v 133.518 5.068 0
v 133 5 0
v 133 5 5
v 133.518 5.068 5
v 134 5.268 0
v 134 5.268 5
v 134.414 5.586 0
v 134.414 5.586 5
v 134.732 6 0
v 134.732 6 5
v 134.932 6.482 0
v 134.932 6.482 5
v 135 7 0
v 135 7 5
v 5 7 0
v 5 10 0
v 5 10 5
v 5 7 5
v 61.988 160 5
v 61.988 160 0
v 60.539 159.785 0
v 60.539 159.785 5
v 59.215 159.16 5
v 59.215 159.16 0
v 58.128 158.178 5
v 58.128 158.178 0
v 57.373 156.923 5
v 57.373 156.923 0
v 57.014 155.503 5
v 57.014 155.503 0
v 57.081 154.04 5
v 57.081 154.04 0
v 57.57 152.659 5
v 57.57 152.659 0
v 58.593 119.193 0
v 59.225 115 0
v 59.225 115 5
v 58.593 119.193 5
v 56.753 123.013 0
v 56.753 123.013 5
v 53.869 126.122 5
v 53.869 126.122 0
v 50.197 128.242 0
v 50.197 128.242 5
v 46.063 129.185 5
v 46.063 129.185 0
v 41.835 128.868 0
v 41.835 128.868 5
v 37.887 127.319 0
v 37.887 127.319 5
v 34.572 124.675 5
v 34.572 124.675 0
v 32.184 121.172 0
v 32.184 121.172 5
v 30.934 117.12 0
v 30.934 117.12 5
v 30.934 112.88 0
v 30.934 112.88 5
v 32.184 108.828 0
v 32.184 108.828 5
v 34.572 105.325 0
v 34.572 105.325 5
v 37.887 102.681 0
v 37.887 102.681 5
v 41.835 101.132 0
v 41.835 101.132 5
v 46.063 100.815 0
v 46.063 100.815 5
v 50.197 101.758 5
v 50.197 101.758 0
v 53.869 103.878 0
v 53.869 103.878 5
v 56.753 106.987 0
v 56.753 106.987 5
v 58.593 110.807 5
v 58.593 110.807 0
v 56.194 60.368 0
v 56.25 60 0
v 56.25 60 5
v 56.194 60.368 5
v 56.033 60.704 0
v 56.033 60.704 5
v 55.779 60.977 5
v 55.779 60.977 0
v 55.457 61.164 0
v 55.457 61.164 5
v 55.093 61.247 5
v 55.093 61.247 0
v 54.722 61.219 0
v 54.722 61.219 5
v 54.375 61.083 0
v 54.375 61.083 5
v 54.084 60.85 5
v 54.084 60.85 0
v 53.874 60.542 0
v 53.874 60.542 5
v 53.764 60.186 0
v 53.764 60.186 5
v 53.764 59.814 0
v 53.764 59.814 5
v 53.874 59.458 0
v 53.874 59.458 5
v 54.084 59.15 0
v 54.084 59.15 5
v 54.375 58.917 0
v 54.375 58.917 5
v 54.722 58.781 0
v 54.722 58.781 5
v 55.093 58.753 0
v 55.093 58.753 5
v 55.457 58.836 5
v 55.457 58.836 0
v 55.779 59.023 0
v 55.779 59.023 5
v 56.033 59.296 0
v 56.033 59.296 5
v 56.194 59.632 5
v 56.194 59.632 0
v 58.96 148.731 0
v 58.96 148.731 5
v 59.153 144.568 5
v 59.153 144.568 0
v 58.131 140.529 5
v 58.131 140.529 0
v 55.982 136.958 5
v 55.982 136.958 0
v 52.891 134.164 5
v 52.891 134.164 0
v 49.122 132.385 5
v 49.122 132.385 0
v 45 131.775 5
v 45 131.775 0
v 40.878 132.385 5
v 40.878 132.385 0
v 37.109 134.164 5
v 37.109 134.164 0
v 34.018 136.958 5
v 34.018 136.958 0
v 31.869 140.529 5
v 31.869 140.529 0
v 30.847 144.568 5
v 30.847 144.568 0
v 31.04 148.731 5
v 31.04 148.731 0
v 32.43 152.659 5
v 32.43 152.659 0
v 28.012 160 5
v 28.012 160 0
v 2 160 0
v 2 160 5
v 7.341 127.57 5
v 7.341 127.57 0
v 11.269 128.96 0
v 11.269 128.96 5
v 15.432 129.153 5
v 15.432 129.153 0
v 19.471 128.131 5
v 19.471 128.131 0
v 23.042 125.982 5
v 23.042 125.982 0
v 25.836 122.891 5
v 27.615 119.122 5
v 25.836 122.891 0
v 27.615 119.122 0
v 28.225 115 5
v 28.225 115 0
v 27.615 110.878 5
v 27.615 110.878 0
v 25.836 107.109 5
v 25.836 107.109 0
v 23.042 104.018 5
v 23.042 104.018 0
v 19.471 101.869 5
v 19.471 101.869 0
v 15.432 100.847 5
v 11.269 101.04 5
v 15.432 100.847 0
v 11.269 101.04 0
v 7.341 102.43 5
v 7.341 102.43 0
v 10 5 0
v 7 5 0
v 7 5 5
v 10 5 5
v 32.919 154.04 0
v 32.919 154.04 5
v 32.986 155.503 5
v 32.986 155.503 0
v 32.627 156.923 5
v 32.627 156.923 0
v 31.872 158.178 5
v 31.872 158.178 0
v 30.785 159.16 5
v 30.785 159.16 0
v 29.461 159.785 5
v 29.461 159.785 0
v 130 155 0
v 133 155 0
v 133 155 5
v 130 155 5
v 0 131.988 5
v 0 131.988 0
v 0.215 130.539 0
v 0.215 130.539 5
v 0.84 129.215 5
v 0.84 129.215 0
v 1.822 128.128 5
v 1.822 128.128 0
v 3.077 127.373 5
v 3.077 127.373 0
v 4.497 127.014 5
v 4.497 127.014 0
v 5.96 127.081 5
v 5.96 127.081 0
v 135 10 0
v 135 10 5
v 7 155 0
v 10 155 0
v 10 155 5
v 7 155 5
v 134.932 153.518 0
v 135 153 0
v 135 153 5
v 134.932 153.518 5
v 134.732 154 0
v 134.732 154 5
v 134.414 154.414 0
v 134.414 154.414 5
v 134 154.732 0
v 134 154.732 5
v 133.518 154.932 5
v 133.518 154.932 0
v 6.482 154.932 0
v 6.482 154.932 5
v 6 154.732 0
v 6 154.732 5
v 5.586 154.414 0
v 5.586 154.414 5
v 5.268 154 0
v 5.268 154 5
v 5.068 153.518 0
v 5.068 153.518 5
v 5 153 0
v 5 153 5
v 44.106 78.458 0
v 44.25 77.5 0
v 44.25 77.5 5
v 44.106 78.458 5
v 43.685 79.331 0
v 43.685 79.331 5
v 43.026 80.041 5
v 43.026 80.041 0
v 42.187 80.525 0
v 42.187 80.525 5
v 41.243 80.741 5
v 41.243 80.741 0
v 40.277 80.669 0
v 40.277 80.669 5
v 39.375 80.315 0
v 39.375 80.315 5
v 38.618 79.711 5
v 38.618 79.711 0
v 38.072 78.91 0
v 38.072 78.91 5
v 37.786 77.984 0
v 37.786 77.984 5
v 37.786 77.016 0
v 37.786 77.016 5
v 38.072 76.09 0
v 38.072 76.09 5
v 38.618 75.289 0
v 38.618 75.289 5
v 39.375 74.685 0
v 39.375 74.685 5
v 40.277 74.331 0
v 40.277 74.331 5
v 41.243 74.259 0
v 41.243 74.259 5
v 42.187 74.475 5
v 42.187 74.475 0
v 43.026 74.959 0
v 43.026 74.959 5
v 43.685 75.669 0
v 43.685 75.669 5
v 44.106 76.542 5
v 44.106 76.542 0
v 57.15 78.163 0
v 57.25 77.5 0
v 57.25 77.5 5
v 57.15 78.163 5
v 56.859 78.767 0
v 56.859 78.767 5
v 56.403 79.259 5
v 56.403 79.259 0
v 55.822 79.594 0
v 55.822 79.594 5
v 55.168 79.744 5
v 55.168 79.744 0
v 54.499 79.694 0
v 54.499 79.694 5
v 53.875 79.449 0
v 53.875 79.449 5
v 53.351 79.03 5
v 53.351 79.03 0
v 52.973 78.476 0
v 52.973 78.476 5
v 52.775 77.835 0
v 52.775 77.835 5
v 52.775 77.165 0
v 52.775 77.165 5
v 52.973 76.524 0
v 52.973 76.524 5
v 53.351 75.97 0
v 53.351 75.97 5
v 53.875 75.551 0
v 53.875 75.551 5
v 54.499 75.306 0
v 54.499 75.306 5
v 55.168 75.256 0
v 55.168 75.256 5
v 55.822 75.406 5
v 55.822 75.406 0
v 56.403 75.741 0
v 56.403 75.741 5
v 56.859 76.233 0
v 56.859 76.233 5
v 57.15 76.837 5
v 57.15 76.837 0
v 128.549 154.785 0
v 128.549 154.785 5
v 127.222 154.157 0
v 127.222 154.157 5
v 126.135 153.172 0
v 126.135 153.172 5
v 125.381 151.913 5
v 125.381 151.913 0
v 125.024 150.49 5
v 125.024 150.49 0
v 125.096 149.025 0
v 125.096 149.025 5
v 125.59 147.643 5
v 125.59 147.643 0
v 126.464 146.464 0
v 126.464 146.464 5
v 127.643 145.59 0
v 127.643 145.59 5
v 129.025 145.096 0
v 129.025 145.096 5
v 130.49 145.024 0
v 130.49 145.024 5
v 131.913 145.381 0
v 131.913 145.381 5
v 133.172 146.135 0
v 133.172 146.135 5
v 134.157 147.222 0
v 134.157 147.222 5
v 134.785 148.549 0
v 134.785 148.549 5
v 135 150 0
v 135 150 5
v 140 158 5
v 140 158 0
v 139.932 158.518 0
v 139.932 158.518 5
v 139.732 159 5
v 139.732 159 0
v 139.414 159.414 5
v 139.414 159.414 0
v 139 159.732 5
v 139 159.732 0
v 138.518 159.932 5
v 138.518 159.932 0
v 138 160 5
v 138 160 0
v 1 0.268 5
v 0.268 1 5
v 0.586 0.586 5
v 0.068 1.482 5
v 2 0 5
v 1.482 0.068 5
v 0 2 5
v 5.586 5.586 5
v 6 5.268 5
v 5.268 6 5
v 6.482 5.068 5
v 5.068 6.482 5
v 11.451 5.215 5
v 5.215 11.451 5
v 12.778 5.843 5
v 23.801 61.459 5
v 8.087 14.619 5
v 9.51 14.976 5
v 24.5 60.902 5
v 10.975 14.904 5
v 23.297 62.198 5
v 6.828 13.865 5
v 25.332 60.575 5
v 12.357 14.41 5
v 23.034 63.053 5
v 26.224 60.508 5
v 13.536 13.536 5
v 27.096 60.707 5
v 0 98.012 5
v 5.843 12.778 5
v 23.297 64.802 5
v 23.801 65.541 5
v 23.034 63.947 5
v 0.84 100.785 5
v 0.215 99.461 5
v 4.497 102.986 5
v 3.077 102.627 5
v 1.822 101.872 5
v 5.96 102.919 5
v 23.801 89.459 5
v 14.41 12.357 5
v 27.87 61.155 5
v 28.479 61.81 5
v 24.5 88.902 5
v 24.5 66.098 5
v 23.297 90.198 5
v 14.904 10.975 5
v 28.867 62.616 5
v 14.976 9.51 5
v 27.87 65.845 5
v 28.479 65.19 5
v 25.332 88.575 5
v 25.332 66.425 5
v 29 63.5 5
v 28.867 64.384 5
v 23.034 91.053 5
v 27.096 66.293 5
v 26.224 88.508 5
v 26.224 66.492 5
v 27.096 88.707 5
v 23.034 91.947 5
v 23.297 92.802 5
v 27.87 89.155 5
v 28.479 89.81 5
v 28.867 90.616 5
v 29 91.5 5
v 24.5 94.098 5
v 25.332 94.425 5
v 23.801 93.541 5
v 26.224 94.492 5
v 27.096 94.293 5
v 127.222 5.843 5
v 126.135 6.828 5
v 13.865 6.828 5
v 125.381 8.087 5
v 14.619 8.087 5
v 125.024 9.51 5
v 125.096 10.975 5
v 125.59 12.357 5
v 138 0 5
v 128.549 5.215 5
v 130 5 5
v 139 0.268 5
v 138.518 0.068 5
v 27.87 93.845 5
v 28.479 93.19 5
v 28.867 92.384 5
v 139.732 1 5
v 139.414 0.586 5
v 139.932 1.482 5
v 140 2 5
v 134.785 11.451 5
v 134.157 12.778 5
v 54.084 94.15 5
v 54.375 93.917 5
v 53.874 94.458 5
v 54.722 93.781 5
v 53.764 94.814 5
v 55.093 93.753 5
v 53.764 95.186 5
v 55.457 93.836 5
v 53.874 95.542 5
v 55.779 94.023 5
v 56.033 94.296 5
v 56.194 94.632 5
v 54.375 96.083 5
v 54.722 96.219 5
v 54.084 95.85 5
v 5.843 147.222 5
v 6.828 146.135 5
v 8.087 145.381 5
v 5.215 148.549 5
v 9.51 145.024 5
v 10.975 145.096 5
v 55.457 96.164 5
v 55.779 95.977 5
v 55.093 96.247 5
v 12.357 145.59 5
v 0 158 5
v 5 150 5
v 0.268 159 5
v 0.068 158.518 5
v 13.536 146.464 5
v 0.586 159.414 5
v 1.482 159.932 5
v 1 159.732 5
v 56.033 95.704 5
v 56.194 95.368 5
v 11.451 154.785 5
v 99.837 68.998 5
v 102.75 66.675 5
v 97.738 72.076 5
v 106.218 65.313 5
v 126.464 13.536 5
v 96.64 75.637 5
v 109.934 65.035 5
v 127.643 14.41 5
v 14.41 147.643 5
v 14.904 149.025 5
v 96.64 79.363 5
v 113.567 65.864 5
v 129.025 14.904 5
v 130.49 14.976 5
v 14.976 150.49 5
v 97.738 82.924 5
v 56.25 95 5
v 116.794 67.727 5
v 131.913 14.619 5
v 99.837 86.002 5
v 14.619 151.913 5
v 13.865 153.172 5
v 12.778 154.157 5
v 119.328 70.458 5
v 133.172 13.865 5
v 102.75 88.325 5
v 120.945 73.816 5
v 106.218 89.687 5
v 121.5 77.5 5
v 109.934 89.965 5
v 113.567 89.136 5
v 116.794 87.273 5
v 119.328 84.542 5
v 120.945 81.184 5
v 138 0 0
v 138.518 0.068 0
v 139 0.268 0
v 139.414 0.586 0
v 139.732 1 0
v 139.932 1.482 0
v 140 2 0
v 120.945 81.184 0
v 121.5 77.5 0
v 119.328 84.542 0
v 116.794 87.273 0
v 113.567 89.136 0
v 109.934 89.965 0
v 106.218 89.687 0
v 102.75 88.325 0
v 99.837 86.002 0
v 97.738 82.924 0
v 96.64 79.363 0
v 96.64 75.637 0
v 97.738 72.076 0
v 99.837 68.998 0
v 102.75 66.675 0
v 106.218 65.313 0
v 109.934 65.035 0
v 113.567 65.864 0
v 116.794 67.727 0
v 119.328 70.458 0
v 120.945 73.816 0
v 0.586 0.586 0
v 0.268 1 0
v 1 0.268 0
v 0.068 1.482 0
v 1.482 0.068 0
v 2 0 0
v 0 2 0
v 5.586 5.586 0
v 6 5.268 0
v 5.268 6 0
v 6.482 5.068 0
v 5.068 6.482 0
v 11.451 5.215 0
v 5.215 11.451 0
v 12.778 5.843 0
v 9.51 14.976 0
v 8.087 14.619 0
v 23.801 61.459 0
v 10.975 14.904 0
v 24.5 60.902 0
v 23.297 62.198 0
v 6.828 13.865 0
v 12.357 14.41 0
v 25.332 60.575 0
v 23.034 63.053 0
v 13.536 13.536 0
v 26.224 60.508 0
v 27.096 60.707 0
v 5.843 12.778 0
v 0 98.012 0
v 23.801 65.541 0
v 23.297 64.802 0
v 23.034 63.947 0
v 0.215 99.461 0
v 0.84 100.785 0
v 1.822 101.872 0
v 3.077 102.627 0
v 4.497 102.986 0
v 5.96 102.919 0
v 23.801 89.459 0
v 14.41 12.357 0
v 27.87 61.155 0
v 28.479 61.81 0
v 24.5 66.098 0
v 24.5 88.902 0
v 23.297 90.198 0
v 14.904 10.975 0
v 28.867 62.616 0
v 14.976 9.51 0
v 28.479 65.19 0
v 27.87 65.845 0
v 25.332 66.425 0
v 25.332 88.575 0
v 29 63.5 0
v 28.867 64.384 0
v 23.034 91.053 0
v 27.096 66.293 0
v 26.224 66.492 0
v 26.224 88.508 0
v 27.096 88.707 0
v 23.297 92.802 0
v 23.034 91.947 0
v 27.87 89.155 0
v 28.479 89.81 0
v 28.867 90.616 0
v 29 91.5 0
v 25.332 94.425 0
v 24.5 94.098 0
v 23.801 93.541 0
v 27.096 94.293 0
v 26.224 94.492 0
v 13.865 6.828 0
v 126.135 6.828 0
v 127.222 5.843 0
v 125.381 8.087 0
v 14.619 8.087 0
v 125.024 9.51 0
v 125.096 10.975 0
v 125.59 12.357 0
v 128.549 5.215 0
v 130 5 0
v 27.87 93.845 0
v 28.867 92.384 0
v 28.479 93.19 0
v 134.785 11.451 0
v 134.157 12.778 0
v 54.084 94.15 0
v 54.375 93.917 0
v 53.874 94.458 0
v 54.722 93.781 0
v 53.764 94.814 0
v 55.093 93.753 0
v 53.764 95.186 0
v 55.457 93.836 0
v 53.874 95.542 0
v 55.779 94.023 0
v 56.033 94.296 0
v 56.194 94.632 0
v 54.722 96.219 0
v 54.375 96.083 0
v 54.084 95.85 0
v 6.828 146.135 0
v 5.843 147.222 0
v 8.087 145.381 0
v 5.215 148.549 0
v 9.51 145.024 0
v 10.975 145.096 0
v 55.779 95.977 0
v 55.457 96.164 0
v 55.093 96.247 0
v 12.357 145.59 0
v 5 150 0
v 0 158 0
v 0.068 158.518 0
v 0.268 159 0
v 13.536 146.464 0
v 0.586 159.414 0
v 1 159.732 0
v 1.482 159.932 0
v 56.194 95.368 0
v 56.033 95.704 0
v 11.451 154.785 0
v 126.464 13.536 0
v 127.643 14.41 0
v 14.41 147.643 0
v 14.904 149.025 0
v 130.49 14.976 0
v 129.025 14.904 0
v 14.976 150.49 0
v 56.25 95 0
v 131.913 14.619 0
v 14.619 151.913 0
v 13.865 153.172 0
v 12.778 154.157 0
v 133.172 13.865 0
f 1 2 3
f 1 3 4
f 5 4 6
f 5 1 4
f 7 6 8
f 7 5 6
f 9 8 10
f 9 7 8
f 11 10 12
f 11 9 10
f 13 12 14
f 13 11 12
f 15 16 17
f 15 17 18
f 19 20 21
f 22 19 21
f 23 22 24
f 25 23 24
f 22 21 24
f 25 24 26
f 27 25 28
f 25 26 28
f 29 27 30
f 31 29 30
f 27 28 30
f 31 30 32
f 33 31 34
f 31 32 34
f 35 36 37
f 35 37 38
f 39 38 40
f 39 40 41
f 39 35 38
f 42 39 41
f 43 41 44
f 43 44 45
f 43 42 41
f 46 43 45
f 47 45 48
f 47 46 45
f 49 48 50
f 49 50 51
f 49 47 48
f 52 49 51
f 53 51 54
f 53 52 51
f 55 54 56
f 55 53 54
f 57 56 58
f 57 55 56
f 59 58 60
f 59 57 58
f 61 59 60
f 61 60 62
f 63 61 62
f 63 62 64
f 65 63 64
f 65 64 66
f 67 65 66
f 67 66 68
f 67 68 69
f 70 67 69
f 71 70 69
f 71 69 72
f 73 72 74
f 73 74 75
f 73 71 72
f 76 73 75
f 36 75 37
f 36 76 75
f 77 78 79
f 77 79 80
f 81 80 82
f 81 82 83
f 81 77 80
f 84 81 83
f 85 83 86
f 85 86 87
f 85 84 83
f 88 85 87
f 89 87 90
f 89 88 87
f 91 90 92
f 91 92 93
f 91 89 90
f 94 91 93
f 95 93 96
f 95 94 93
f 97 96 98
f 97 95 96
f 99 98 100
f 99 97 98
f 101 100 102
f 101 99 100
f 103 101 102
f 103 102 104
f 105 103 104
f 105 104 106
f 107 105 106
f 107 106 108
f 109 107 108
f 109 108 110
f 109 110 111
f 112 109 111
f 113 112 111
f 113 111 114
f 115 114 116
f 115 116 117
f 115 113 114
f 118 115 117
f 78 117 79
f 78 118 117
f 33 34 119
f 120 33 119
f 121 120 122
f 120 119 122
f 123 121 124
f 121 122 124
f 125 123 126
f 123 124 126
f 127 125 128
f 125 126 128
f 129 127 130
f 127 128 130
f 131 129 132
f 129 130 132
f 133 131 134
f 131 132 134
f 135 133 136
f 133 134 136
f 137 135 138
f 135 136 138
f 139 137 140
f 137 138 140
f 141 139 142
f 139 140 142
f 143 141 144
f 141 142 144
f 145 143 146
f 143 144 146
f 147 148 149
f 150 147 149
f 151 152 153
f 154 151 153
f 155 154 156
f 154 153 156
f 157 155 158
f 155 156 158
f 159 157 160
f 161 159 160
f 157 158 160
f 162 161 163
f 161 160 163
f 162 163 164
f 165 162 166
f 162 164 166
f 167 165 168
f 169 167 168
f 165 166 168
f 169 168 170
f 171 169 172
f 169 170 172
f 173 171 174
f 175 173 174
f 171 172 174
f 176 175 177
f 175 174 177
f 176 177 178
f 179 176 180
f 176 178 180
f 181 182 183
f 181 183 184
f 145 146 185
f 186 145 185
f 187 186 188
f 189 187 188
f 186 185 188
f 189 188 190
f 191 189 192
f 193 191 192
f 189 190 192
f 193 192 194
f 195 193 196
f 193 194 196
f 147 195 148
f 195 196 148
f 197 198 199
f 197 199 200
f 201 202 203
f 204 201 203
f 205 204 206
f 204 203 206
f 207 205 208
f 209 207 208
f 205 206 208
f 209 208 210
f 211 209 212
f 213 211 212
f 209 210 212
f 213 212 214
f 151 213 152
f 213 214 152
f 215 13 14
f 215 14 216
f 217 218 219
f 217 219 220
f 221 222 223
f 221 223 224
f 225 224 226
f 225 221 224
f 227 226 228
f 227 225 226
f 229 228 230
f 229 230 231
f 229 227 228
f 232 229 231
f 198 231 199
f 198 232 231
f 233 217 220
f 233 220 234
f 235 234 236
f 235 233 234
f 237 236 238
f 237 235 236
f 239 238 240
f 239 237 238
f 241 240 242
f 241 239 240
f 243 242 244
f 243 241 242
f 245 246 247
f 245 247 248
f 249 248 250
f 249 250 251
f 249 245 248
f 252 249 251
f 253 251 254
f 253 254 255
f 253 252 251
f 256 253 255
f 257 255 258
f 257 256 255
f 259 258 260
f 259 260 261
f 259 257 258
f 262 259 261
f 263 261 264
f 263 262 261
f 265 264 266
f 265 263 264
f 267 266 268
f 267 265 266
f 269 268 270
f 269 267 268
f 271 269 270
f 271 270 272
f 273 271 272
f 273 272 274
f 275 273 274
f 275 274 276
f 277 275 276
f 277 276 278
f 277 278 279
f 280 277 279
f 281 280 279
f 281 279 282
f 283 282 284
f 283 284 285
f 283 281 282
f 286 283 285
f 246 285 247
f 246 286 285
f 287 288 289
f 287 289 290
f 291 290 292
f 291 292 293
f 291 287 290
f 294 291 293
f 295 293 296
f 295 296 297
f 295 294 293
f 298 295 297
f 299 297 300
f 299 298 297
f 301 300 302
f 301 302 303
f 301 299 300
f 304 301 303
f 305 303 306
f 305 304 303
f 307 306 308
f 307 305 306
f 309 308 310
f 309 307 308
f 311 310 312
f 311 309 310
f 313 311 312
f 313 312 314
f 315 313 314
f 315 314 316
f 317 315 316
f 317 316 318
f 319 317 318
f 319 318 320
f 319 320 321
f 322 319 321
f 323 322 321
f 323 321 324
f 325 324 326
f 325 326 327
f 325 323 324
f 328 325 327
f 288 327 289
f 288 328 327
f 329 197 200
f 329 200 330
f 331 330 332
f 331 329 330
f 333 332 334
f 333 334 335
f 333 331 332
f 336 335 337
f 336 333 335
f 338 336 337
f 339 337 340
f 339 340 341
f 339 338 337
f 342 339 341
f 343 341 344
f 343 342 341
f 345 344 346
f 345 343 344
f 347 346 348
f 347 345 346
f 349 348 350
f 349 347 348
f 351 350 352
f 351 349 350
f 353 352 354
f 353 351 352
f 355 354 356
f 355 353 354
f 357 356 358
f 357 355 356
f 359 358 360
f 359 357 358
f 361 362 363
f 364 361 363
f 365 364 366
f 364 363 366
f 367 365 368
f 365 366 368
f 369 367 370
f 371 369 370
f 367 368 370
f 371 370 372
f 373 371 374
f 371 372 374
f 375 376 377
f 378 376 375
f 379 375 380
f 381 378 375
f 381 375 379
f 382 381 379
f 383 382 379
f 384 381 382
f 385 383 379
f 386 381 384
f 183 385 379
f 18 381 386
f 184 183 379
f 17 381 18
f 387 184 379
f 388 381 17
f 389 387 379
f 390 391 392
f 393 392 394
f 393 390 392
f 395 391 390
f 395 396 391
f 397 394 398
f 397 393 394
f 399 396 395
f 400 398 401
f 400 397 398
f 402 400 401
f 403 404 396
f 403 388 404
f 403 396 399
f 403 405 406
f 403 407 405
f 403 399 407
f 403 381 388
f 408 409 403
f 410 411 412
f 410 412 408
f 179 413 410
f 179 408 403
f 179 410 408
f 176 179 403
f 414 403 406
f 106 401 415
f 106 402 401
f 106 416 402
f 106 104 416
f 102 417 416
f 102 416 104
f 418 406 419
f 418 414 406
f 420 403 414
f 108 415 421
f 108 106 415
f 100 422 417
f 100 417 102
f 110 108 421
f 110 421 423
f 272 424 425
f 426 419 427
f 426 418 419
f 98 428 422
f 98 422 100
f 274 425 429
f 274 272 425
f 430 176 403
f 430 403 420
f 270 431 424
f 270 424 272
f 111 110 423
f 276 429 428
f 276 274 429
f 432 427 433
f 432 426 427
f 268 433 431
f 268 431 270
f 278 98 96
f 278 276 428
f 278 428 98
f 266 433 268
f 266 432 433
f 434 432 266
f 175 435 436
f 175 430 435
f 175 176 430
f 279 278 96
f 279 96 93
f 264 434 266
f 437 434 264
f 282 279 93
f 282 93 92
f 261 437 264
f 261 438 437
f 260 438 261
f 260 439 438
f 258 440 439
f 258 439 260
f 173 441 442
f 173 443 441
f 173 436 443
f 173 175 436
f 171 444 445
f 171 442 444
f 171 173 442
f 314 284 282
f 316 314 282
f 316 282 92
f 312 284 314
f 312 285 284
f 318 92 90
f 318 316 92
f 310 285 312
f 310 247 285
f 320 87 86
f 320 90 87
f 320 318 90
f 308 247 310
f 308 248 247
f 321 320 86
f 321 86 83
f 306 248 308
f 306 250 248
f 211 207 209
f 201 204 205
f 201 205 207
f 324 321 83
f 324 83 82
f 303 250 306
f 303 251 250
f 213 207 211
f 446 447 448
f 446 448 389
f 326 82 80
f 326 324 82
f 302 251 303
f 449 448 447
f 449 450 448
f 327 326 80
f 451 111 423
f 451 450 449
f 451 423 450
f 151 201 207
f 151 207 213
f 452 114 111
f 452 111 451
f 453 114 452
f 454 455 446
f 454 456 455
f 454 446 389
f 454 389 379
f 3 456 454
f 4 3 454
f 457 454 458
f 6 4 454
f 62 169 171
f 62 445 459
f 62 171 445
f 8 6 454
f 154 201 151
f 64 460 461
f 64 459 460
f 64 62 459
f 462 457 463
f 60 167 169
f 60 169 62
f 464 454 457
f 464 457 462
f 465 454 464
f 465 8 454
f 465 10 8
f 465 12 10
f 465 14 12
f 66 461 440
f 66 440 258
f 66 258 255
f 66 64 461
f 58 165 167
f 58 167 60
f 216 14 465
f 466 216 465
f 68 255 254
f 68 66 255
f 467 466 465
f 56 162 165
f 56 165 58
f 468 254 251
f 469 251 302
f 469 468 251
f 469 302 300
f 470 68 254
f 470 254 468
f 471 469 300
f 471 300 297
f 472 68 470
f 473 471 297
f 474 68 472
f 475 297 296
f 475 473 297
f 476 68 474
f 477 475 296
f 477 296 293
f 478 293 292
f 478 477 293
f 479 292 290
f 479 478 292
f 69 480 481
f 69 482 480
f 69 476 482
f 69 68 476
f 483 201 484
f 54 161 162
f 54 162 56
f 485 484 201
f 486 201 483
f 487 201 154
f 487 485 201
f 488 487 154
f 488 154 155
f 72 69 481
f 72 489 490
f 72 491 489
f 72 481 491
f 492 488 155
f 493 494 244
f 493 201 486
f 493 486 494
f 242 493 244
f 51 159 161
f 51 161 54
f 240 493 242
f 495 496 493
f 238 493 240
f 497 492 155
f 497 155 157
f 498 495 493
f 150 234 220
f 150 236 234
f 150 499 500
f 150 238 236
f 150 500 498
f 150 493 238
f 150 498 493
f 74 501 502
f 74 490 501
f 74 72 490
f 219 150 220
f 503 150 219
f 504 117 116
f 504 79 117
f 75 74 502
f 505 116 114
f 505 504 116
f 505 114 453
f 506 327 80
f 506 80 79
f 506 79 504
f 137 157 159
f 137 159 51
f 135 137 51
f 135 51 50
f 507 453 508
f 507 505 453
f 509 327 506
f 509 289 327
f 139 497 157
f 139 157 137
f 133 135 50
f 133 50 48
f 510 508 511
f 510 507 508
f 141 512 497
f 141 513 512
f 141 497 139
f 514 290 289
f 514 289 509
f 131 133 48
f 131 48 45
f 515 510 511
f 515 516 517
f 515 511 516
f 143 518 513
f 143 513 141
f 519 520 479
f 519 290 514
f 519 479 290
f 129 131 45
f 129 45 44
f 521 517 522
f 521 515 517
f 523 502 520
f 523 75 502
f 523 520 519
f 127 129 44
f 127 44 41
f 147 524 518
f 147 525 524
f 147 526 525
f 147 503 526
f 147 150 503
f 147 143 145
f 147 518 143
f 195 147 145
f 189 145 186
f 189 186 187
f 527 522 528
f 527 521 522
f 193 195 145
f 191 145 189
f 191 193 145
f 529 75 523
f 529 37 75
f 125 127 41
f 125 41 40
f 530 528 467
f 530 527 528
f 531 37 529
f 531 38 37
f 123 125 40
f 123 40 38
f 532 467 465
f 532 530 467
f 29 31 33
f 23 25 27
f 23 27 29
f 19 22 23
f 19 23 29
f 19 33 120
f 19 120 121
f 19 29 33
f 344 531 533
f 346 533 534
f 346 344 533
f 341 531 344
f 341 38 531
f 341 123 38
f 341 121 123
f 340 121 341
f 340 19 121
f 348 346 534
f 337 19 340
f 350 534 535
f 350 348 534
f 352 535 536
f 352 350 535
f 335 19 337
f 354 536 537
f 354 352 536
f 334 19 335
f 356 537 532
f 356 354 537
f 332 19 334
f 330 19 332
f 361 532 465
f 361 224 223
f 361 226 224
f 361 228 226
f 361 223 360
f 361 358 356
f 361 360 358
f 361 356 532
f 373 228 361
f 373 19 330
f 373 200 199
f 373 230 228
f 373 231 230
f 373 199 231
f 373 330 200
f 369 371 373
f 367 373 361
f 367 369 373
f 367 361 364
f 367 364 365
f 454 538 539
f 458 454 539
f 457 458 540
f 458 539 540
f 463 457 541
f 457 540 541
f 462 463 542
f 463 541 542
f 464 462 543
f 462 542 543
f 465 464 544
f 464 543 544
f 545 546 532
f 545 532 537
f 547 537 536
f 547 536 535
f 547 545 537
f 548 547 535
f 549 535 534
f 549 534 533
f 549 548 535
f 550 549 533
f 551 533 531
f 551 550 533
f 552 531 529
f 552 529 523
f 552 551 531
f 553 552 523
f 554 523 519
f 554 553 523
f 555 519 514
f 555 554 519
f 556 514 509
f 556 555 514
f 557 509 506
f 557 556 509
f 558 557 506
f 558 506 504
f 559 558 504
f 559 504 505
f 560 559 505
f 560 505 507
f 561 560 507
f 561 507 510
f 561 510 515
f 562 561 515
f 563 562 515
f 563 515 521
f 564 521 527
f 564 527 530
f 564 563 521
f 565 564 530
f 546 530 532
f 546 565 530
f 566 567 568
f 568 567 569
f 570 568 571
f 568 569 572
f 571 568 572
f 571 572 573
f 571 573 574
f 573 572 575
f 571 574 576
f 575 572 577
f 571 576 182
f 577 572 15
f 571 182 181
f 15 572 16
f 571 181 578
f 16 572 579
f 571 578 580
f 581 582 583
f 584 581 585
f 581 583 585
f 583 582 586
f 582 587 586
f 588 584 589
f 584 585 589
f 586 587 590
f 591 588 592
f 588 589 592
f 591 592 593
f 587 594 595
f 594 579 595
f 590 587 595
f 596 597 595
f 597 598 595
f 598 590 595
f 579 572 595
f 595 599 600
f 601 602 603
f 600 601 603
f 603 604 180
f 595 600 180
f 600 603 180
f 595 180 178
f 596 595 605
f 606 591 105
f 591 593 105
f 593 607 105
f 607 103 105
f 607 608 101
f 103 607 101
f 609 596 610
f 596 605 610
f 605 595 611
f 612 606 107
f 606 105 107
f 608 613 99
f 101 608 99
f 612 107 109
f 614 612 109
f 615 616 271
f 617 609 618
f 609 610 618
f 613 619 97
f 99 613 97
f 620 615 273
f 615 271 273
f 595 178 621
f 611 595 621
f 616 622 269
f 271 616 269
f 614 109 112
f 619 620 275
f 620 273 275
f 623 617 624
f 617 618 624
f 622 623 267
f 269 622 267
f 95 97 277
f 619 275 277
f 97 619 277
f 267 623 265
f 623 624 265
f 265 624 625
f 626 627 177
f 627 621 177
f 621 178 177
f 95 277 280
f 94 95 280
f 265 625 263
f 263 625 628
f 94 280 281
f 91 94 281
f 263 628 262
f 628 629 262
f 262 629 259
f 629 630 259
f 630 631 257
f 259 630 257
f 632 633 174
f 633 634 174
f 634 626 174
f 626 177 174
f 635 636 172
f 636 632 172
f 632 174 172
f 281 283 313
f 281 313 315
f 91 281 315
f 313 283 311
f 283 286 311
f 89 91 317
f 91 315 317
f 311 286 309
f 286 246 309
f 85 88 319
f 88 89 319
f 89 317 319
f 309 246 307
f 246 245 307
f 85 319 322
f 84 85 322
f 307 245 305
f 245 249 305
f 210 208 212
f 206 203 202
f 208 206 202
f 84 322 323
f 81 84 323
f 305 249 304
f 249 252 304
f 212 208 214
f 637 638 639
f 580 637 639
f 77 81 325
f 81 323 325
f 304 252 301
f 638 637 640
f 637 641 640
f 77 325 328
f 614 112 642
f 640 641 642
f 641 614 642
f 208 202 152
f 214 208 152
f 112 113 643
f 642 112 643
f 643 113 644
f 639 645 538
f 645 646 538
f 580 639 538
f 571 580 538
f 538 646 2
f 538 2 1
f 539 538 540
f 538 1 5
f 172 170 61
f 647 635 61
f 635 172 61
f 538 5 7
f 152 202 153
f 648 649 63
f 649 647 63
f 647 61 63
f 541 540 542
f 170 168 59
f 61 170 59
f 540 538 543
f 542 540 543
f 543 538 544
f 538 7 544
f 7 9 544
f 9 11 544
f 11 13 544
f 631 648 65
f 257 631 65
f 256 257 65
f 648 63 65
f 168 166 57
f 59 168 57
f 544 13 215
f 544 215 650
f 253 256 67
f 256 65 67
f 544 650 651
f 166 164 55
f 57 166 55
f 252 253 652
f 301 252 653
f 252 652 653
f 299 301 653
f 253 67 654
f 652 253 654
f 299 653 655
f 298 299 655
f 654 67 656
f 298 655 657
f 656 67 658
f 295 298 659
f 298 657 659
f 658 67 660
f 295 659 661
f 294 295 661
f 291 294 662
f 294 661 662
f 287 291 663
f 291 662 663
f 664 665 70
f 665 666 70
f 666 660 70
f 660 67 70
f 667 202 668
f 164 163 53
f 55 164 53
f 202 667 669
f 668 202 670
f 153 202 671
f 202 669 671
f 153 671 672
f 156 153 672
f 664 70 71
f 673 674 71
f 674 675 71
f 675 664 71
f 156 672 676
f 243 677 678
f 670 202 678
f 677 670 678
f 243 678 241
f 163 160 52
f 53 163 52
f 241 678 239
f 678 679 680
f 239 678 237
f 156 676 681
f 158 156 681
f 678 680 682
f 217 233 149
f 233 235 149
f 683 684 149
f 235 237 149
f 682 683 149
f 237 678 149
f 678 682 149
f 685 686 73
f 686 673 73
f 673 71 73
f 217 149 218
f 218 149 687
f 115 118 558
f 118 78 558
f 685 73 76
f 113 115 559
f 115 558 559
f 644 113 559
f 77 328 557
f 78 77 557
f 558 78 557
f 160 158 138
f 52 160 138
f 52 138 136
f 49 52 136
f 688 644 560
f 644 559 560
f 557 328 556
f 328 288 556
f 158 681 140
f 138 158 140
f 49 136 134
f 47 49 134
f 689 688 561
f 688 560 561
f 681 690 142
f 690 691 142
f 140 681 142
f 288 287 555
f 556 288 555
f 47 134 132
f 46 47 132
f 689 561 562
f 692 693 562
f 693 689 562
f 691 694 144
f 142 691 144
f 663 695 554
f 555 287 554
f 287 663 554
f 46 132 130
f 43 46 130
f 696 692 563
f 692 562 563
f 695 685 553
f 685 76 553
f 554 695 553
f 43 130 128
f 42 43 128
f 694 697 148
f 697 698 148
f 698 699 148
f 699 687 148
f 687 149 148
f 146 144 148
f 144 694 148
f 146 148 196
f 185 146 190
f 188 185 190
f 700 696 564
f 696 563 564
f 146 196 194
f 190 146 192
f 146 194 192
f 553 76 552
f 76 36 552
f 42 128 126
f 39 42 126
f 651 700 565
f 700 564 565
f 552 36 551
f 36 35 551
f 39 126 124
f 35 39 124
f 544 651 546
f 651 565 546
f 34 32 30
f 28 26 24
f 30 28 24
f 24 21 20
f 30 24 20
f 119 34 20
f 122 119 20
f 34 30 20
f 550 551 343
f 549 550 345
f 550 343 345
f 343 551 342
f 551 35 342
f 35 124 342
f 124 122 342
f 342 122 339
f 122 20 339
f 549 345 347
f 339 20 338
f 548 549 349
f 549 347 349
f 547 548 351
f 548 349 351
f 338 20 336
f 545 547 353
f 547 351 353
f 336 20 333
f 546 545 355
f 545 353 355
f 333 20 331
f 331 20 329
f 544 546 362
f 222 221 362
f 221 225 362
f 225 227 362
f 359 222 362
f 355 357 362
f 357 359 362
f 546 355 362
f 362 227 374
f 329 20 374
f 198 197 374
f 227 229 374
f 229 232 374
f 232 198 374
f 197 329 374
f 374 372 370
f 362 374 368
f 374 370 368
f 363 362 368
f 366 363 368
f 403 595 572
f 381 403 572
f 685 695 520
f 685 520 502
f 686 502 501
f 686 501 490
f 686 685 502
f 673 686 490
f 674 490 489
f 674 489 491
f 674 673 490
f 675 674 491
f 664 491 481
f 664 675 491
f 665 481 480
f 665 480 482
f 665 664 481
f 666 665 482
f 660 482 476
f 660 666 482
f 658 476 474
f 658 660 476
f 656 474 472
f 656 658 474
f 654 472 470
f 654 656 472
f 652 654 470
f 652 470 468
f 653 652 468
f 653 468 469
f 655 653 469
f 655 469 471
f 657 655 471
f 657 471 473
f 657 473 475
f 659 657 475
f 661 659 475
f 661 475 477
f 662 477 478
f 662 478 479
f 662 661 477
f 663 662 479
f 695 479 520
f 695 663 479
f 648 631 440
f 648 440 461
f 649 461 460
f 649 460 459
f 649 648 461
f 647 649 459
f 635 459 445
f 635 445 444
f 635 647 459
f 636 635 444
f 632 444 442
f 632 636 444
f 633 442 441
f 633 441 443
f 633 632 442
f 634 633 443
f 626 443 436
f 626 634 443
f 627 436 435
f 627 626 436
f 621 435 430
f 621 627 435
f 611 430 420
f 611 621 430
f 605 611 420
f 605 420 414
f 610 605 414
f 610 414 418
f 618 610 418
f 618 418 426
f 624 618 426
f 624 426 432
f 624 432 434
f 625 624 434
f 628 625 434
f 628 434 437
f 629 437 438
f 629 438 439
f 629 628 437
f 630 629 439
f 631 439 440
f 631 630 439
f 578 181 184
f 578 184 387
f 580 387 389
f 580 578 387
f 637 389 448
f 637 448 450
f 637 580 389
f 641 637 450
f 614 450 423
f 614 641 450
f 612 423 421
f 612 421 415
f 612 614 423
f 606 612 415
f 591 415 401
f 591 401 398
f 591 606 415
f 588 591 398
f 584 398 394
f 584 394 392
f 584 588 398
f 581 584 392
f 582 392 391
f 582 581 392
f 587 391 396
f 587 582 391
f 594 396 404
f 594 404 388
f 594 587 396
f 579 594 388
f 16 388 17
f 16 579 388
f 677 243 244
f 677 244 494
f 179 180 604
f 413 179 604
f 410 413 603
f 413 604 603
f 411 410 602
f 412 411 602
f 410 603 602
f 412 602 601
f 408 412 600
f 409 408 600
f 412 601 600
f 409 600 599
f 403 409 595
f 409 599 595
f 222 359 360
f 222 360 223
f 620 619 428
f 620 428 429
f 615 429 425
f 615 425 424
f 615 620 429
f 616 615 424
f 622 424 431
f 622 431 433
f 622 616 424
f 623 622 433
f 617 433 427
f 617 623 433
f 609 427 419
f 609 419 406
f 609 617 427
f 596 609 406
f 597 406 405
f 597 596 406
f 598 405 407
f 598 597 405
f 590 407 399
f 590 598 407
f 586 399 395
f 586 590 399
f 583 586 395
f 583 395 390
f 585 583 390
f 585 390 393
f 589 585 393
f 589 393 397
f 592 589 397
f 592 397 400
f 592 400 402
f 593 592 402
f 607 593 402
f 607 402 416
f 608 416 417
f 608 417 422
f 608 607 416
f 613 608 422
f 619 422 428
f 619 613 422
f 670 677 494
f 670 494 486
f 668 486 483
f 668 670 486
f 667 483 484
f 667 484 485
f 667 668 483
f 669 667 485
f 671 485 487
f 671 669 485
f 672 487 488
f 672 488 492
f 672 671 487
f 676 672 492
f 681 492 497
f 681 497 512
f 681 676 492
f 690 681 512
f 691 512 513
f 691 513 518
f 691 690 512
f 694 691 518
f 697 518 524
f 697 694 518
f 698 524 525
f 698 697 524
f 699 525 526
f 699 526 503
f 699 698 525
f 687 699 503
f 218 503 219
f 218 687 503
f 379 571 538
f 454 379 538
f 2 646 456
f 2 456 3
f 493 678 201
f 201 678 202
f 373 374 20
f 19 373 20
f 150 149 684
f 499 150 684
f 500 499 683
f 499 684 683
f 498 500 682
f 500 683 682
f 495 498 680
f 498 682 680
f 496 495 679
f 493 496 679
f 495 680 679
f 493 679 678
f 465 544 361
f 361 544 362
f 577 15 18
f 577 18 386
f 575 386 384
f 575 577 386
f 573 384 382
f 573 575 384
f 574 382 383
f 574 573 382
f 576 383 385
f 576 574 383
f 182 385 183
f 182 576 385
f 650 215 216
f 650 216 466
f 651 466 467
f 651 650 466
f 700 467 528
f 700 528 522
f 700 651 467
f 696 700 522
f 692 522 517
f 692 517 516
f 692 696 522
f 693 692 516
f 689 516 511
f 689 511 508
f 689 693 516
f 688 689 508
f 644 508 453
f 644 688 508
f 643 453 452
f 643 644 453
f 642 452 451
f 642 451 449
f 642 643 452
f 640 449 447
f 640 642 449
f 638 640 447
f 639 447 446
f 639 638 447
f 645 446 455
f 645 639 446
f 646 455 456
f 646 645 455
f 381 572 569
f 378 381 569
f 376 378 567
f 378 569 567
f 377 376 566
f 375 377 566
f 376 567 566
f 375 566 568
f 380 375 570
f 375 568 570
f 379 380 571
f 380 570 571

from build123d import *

# Parameters (mm, degrees)
MODEL_R             = 3
MODEL_R_2           = 2.25
MODEL_R_3           = 1.25
MODEL_R_4           = 12.5
MODEL_R_5           = 3.25
MODEL_R_6           = 14.225
BOSS_EXTRUDE1_DEPTH = 5


with BuildPart() as part:
    # Model → Boss-Extrude1 (new body)
    with BuildSketch(Plane.XY):
        with BuildLine():
            Line((28.011750385, 160), (2, 160))
            ThreePointArc((2, 160), (0.585786438, 159.414213562), (0, 158))
            Line((0, 158), (0, 131.988249615))
            ThreePointArc((0, 131.988249615), (2.421581013, 127.704354714), (7.340702211, 127.569979234))
            ThreePointArc((7.340702211, 127.569979234), (28.225, 115), (7.340702211, 102.430020766))
            ThreePointArc((7.340702211, 102.430020766), (2.421581013, 102.295645286), (0, 98.011750385))
            Line((0, 98.011750385), (0, 2))
            ThreePointArc((0, 2), (0.585786438, 0.585786438), (2, 0))
            Line((2, 0), (138, 0))
            ThreePointArc((138, 0), (139.414213562, 0.585786438), (140, 2))
            Line((140, 2), (140, 158))
            ThreePointArc((140, 158), (139.414213562, 159.414213562), (138, 160))
            Line((138, 160), (61.988249616, 160))
            ThreePointArc((61.988249616, 160), (57.704354714, 157.578418987), (57.569979234, 152.659297789))
            ThreePointArc((57.569979234, 152.659297789), (45, 131.775), (32.430020766, 152.659297789))
            ThreePointArc((32.430020766, 152.659297789), (32.295645286, 157.578418987), (28.011750385, 160))
        make_face()
        with Locations((26, 91.5)):
            Circle(MODEL_R, mode=Mode.SUBTRACT)
        with Locations((55, 77.5)):
            Circle(MODEL_R_2, mode=Mode.SUBTRACT)
        with Locations((55, 60)):
            Circle(MODEL_R_3, mode=Mode.SUBTRACT)
        with Locations((109, 77.5)):
            Circle(MODEL_R_4, mode=Mode.SUBTRACT)
        with Locations((55, 95)):
            Circle(MODEL_R_3, mode=Mode.SUBTRACT)
        with Locations((26, 63.5)):
            Circle(MODEL_R, mode=Mode.SUBTRACT)
        with Locations((41, 77.5)):
            Circle(MODEL_R_5, mode=Mode.SUBTRACT)
        with Locations((45, 115)):
            Circle(MODEL_R_6, mode=Mode.SUBTRACT)
        with BuildLine():
            Line((5, 153), (5, 150))
            ThreePointArc((5, 150), (13.535533906, 146.464466094), (10, 155))
            Line((10, 155), (7, 155))
            ThreePointArc((7, 155), (5.585786438, 154.414213562), (5, 153))
        make_face(mode=Mode.SUBTRACT)
        with BuildLine():
            Line((7, 5), (10, 5))
            ThreePointArc((10, 5), (13.535533906, 13.535533906), (5, 10))
            Line((5, 10), (5, 7))
            ThreePointArc((5, 7), (5.585786438, 5.585786438), (7, 5))
        make_face(mode=Mode.SUBTRACT)
        with BuildLine():
            Line((135, 7), (135, 10))
            ThreePointArc((135, 10), (126.464466094, 13.535533906), (130, 5))
            Line((130, 5), (133, 5))
            ThreePointArc((133, 5), (134.414213562, 5.585786438), (135, 7))
        make_face(mode=Mode.SUBTRACT)
        with BuildLine():
            Line((133, 155), (130, 155))
            ThreePointArc((130, 155), (126.464466094, 146.464466094), (135, 150))
            Line((135, 150), (135, 153))
            ThreePointArc((135, 153), (134.414213562, 154.414213562), (133, 155))
        make_face(mode=Mode.SUBTRACT)
    extrude(amount=BOSS_EXTRUDE1_DEPTH)


solid = part.part
